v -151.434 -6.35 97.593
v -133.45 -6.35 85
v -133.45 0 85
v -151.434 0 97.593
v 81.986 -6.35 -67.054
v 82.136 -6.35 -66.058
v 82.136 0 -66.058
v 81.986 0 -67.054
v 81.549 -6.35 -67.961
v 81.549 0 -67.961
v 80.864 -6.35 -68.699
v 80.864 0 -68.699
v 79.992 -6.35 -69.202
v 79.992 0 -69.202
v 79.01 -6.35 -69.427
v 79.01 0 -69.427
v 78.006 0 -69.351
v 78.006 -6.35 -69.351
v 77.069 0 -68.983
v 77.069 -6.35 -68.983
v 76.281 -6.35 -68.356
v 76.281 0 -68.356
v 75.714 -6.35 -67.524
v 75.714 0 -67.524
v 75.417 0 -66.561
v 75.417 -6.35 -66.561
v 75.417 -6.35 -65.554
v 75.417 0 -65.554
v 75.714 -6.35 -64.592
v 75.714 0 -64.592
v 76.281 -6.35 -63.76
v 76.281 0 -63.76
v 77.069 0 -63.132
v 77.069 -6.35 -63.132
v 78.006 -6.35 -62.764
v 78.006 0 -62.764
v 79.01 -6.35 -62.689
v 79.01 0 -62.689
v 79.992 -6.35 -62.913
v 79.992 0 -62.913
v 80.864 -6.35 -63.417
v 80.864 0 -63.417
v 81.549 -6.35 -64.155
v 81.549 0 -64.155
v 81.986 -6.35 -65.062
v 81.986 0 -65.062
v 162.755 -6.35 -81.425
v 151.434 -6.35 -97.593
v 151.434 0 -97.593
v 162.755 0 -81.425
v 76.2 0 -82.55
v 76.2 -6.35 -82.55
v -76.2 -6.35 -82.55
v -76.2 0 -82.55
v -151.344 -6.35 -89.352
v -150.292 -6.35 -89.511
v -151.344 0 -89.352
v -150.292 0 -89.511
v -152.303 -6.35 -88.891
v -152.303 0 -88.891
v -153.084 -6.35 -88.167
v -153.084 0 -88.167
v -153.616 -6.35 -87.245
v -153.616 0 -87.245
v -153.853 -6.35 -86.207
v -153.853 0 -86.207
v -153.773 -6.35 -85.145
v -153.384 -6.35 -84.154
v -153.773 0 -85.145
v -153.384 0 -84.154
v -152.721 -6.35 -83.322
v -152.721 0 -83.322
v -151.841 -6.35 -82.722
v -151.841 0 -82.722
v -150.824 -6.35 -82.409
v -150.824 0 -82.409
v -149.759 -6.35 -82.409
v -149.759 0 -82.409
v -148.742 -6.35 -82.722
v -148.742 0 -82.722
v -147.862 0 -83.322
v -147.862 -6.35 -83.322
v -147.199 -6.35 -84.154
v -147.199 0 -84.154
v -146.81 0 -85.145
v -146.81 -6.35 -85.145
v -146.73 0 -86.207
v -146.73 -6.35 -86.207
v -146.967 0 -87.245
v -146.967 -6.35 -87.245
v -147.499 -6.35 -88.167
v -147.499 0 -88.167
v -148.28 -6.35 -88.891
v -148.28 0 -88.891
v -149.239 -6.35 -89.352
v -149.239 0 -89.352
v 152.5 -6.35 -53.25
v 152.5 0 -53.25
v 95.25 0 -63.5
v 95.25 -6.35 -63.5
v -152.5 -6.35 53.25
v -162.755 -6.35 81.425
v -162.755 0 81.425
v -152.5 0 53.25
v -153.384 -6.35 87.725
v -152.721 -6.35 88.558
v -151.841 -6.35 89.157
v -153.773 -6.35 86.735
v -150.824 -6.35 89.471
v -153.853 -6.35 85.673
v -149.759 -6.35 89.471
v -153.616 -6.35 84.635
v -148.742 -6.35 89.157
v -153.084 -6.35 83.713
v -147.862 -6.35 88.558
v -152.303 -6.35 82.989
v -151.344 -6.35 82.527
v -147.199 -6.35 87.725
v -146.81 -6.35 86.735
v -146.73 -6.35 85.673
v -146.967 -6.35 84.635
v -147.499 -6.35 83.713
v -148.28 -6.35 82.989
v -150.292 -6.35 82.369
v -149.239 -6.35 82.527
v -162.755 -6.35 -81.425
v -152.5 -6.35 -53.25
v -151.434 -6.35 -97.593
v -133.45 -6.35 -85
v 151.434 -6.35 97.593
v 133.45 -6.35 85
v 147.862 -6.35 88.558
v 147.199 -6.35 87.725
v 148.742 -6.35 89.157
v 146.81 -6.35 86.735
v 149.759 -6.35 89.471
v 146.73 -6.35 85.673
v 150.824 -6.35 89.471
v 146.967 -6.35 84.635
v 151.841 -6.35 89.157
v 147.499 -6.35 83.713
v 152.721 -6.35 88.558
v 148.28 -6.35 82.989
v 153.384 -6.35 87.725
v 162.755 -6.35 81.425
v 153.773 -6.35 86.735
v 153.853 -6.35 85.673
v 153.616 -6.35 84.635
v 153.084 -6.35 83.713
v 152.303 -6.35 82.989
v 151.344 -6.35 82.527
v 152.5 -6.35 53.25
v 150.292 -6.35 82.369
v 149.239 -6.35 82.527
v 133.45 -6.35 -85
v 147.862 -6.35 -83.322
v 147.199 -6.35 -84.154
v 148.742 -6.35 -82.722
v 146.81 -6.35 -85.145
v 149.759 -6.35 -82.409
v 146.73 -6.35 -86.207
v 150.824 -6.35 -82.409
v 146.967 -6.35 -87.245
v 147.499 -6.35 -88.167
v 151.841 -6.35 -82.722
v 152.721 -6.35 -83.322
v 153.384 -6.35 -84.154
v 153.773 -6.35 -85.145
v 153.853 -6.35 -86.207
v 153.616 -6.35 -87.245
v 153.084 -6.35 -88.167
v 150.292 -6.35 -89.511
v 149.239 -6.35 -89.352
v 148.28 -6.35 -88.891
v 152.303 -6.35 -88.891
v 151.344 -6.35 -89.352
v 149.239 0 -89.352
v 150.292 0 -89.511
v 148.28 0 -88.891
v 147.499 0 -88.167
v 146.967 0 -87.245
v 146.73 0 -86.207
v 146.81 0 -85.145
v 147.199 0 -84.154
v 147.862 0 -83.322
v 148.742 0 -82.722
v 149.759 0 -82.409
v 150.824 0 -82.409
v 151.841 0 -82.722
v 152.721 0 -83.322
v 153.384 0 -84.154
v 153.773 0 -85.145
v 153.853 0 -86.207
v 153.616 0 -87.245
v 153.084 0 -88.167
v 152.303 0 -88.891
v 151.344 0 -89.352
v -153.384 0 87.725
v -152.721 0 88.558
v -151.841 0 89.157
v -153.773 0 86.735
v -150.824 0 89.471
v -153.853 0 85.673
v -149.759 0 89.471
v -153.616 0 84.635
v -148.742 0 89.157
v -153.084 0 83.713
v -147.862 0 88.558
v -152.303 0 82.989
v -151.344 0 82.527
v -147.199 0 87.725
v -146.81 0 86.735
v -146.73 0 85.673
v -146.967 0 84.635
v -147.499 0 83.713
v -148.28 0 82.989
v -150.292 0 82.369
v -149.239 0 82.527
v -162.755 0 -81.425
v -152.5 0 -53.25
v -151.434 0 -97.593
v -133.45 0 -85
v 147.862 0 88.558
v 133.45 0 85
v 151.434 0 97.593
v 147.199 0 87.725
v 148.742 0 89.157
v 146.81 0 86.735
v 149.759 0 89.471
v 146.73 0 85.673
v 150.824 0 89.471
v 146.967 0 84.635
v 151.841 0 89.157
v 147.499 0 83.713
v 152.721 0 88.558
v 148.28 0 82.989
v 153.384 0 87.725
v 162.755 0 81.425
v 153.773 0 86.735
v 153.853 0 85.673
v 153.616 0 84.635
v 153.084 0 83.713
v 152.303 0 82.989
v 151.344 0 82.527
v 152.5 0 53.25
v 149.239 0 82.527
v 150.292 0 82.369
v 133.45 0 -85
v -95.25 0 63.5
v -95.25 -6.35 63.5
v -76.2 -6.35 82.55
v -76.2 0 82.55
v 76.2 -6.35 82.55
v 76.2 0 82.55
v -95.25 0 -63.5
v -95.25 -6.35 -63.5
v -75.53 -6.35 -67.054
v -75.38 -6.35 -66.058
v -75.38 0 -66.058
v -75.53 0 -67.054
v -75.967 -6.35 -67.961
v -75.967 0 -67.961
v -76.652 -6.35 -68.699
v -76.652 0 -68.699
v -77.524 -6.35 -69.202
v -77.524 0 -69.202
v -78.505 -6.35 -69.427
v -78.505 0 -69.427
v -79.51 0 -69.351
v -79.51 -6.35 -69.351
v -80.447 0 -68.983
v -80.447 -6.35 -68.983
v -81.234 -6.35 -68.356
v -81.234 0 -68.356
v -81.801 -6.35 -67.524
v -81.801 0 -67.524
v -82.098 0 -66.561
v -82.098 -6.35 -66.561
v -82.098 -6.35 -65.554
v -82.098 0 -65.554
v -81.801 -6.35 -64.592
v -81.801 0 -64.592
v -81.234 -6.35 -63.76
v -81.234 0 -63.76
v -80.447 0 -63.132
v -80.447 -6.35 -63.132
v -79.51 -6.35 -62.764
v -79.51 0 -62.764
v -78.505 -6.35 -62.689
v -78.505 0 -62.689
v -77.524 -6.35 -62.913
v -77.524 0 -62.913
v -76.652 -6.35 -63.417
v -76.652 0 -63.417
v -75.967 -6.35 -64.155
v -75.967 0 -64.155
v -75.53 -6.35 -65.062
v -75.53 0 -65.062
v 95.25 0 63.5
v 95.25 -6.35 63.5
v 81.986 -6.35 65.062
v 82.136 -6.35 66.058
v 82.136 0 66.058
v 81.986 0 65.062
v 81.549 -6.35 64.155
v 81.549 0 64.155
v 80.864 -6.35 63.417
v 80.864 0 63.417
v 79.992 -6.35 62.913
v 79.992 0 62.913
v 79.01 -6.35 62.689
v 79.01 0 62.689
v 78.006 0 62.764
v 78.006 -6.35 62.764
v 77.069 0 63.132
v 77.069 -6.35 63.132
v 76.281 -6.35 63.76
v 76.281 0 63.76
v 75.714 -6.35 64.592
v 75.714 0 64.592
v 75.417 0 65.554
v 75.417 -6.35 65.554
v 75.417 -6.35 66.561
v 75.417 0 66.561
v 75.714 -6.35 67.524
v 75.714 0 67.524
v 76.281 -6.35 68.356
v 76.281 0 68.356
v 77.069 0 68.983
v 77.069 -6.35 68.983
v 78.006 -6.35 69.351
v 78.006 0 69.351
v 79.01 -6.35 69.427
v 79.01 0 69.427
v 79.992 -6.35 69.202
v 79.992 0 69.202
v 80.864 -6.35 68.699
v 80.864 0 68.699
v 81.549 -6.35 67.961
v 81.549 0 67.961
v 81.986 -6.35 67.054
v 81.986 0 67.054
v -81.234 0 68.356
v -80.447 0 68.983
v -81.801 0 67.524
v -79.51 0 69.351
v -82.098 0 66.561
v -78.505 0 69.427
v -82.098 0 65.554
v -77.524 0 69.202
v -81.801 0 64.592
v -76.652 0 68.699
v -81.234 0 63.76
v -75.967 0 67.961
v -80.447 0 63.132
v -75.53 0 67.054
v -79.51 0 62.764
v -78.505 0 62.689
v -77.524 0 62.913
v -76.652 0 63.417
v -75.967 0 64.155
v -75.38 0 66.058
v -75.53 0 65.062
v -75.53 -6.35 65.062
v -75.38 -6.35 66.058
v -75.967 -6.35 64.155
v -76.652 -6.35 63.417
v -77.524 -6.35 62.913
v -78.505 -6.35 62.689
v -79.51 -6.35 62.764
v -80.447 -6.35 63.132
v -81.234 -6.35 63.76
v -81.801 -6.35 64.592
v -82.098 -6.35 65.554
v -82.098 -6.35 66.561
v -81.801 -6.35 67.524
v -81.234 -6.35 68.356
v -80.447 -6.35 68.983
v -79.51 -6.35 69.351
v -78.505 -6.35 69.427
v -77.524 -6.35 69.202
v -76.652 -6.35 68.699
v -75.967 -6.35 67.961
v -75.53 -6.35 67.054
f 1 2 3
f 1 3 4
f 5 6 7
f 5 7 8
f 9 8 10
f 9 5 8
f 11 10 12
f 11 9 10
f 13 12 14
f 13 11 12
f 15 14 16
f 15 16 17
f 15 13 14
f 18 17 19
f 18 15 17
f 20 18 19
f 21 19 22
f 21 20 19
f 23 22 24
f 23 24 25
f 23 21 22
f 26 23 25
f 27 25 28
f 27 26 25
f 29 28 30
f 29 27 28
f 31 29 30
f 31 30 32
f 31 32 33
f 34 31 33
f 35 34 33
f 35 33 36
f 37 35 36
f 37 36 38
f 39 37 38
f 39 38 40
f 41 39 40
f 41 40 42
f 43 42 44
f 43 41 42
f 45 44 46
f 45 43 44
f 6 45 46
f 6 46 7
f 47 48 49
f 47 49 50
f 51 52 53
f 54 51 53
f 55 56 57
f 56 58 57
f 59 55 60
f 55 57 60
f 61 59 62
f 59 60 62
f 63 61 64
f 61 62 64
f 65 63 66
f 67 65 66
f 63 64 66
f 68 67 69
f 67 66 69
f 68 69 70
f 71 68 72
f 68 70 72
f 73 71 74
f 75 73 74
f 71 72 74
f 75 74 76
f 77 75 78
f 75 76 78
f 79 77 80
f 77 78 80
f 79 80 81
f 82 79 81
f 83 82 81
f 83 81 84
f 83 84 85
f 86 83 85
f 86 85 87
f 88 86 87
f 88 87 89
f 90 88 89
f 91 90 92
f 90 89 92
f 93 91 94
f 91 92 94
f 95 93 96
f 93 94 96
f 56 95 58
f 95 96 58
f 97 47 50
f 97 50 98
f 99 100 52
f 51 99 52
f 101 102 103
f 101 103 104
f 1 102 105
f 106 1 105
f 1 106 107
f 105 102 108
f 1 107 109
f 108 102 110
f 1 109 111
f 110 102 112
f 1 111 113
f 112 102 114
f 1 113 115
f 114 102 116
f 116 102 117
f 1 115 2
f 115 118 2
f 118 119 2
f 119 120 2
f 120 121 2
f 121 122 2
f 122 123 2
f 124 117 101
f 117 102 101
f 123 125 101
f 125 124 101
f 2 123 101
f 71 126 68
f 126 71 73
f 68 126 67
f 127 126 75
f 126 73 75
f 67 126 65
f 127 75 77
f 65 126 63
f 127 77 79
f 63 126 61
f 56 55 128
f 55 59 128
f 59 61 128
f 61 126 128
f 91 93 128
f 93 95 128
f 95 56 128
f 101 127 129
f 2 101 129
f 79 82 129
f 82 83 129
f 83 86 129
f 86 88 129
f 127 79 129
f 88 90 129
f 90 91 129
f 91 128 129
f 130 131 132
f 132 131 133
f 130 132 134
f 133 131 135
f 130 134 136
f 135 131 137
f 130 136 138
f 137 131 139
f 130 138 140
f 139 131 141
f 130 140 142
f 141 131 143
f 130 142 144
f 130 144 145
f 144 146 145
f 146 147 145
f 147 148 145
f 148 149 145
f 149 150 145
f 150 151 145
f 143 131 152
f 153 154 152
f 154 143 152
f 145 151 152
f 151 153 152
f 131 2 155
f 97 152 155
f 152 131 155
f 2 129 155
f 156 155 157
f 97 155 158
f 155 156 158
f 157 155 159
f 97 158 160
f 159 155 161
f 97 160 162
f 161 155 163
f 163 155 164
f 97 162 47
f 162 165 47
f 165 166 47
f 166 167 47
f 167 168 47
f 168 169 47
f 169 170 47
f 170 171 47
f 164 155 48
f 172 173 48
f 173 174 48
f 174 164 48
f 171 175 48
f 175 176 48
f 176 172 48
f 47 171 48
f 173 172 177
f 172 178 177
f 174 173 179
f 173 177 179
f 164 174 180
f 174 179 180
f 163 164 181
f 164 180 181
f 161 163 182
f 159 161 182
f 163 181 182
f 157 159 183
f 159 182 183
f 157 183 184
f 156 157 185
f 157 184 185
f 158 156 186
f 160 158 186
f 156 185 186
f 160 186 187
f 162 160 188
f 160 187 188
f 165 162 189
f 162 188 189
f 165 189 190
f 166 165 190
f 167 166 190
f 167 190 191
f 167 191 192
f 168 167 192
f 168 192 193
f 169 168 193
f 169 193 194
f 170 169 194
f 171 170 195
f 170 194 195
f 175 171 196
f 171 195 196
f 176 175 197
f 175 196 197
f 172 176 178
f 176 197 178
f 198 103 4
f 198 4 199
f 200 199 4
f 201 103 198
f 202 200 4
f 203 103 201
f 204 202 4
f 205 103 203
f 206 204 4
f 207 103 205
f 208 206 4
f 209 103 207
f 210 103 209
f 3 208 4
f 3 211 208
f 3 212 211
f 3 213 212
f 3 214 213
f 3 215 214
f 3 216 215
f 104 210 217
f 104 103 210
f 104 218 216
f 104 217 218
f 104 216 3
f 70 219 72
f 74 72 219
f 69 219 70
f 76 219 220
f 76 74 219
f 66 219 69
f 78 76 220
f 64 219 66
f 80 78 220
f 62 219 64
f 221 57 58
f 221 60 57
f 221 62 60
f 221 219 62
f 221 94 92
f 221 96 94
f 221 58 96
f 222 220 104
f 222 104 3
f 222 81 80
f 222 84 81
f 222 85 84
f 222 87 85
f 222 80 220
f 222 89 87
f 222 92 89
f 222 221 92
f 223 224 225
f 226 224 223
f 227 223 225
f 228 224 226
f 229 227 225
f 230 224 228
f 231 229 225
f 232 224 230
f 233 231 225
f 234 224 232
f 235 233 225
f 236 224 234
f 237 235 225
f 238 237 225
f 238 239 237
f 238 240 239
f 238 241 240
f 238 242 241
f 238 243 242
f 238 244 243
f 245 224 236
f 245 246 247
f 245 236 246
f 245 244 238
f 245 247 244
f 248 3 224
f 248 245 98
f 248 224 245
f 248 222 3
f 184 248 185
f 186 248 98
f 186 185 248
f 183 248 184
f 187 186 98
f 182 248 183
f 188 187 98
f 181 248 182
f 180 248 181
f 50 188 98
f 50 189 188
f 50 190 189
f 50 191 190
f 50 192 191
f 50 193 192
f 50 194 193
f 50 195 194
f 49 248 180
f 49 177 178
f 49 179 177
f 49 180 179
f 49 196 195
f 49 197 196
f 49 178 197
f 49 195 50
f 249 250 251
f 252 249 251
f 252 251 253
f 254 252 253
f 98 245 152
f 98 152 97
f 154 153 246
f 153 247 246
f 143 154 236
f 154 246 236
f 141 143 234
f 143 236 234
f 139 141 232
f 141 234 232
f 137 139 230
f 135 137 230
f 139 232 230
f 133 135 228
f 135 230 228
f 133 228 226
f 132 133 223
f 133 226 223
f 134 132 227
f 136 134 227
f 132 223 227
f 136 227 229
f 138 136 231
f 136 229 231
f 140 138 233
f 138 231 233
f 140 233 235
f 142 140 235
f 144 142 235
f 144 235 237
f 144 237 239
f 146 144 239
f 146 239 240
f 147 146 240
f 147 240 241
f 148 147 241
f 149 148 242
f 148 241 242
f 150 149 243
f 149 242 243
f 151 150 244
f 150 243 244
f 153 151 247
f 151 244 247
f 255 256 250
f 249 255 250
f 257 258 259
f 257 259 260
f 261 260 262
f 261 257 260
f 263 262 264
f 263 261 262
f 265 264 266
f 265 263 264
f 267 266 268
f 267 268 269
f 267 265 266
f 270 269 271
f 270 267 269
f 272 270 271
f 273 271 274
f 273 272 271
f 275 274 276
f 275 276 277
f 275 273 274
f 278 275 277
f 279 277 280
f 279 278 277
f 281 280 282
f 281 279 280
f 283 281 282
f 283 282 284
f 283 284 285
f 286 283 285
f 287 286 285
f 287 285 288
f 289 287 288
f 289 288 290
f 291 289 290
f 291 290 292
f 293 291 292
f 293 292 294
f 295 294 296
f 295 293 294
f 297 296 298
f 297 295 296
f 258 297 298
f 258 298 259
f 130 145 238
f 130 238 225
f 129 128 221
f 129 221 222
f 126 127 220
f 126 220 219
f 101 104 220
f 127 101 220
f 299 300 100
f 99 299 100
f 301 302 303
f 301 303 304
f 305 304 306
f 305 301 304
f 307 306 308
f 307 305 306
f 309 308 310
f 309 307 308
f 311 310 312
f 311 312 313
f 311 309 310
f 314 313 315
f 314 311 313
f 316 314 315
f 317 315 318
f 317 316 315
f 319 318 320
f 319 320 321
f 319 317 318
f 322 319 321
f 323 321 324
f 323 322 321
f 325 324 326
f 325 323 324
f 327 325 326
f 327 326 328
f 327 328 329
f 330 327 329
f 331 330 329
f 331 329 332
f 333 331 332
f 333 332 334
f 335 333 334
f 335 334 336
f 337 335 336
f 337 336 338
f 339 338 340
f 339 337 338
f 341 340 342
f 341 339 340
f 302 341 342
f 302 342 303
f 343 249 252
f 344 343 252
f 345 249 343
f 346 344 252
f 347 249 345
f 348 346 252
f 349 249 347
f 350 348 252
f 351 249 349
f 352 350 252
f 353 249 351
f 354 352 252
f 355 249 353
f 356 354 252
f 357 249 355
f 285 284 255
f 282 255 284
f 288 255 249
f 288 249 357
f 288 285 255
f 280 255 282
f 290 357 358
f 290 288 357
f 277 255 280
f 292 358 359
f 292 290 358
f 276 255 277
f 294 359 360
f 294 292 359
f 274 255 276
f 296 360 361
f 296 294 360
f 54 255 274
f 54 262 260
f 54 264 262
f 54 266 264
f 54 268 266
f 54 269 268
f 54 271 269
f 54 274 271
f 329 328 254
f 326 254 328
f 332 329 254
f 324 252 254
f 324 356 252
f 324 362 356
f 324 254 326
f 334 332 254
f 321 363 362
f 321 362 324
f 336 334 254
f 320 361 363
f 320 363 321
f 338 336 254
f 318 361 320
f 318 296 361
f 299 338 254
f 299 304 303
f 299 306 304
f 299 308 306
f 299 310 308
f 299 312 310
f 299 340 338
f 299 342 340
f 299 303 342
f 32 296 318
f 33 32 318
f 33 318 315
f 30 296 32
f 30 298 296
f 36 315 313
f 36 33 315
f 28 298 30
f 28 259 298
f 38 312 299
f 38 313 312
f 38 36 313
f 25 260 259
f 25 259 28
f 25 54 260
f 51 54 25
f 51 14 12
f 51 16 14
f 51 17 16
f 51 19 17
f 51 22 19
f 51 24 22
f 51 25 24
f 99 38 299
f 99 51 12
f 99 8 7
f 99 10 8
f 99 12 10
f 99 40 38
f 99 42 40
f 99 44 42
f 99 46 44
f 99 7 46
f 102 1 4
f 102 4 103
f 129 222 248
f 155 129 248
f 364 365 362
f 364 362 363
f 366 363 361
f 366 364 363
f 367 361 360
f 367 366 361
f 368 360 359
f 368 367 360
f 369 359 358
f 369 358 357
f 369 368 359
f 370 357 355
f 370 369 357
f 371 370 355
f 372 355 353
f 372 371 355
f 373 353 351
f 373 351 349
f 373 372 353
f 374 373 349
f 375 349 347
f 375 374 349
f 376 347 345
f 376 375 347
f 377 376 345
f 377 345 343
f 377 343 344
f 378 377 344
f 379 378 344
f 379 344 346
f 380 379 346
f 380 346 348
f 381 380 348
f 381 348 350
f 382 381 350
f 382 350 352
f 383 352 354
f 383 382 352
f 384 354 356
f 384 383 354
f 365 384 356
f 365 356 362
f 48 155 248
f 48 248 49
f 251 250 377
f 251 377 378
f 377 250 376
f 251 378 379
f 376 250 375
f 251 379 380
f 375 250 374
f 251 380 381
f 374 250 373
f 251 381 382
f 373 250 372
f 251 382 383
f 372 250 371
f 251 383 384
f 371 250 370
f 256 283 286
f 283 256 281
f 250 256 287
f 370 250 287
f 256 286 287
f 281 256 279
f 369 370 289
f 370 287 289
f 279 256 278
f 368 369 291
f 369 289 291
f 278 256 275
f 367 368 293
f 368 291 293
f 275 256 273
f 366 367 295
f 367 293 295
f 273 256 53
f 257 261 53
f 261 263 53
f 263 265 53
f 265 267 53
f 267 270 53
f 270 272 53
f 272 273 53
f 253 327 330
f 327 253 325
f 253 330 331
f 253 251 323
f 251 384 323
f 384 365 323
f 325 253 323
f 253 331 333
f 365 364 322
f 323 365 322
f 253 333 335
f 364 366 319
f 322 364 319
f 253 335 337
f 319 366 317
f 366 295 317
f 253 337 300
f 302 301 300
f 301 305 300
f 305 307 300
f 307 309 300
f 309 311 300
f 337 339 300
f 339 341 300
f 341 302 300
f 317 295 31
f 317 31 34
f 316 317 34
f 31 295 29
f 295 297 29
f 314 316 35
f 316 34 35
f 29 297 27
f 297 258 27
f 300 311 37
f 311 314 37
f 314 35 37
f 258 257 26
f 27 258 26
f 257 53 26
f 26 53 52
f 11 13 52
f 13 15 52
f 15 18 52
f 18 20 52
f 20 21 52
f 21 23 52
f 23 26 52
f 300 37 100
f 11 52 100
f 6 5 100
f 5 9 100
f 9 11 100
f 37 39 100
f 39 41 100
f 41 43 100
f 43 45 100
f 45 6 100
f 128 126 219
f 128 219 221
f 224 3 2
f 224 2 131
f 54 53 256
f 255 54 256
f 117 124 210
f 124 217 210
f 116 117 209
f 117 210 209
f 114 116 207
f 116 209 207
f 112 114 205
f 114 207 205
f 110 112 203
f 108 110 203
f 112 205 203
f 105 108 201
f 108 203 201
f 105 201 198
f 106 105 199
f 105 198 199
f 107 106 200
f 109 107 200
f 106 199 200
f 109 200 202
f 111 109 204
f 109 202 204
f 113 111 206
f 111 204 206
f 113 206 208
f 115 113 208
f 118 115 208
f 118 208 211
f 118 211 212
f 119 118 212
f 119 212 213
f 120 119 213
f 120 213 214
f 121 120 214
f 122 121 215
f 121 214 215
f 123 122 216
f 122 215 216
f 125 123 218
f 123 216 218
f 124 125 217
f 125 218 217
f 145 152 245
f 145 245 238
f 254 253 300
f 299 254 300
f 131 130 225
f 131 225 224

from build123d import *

# Parameters (mm, degrees)
MARKUP1_START                    = -6.35
MARKUP1_OUTLINE_R                = 3.3782
MARKUP1_DEPTH                    = 6.35
SKETCH2_W                        = 305.000000108
SKETCH2_H                        = 170.000000106
BOSS_EXTRUDE1_DEPTH              = 6.35
BOSS_EXTRUDE2_DEPTH              = 6.35
SKETCH5_W                        = 3.57124
SKETCH5_H                        = 6.35
F_1_4_CLEARANCE_HOLE1_AT_2_COUNT = 2
F_1_4_CLEARANCE_HOLE1_AT_2_PITCH = 300.583026684
F_1_4_CLEARANCE_HOLE1_AT_3_COUNT = 2
F_1_4_CLEARANCE_HOLE1_AT_3_PITCH = 346.255396975
F_1_4_CLEARANCE_HOLE1_AT_4_COUNT = 2
F_1_4_CLEARANCE_HOLE1_AT_4_PITCH = 171.879737036


# Read off the part's stored shape, not the designer's step: Markup1
with BuildPart() as part:
    # Markup1 outline → Markup1 (new body)
    with BuildSketch(Plane(origin=(0, 0, 0), x_dir=(1, 0, 0), z_dir=(0, 1, 0)).offset(MARKUP1_START)):
        Polygon((76.2, -82.55), (95.25, -63.5), (95.25, 63.5), (76.2, 82.55), (-76.2, 82.55), (-95.25, 63.5), (-95.25, -63.5), (-76.2, -82.55), align=None)
        with Locations((-78.75778, -66.05778)):
            Circle(MARKUP1_OUTLINE_R, mode=Mode.SUBTRACT)
        with Locations((78.75778, -66.05778)):
            Circle(MARKUP1_OUTLINE_R, mode=Mode.SUBTRACT)
        with Locations((-78.75778, 66.05778)):
            Circle(MARKUP1_OUTLINE_R, mode=Mode.SUBTRACT)
        with Locations((78.75778, 66.05778)):
            Circle(MARKUP1_OUTLINE_R, mode=Mode.SUBTRACT)
    extrude(amount=MARKUP1_DEPTH)


with BuildPart() as body_2:
    # Sketch2 → Boss-Extrude1 (new body)
    with BuildSketch(Plane(origin=(0, 0, 0), x_dir=(1, 0, 0), z_dir=(0, 1, 0))):
        Rectangle(SKETCH2_W, SKETCH2_H)
    extrude(amount=-BOSS_EXTRUDE1_DEPTH)

    # Sketch3 → Boss-Extrude2 (add)
    with BuildSketch(Plane.XZ.offset(6.35)):
        Polygon((133.450000054, 85.000000053), (133.450000054, 53.250000053), (152.500000054, 53.250000053), (162.75496375, 81.425281244), (151.4343574, 97.592782637), align=None)
        Polygon((152.500000054, -53.250000053), (133.450000054, -53.250000053), (133.450000054, -85.000000053), (151.4343574, -97.592782637), (162.75496375, -81.425281244), align=None)
        Polygon((-133.450000054, -85.000000053), (-133.450000054, -53.250000053), (-152.500000054, -53.250000053), (-162.75496375, -81.425281244), (-151.4343574, -97.592782637), align=None)
        Polygon((-152.500000054, 53.250000053), (-133.450000054, 53.250000053), (-133.450000054, 85.000000053), (-151.4343574, 97.592782637), (-162.75496375, 81.425281244), align=None)
    extrude(amount=-BOSS_EXTRUDE2_DEPTH)

    # Sketch5 → 1/4 Clearance Hole1 (revolve, cut)
    with BuildSketch(Plane(origin=(150.291513342, -6.35, -85.939868518), x_dir=(0, 0, -1), z_dir=(1, 0, 0))):
        with Locations((1.78562, 3.175)):
            Rectangle(SKETCH5_W, SKETCH5_H)
    f_1_4_clearance_hole1 = revolve(axis=Axis((150.291513342, -12.7, -85.939868518), (0, 1, 0)), mode=Mode.SUBTRACT)

    # 1/4 Clearance Hole1 at 2: 1/4 Clearance Hole1 ×2
    with Locations(*[(-i * F_1_4_CLEARANCE_HOLE1_AT_2_PITCH, 0, 0) for i in range(1, F_1_4_CLEARANCE_HOLE1_AT_2_COUNT)]):
        add(f_1_4_clearance_hole1, mode=Mode.SUBTRACT)

    # 1/4 Clearance Hole1 at 3: 1/4 Clearance Hole1 ×2
    with Locations(*[Vector(-0.8680962934015001, 0, 0.49639583537996856) * (i * F_1_4_CLEARANCE_HOLE1_AT_3_PITCH) for i in range(1, F_1_4_CLEARANCE_HOLE1_AT_3_COUNT)]):
        add(f_1_4_clearance_hole1, mode=Mode.SUBTRACT)

    # 1/4 Clearance Hole1 at 4: 1/4 Clearance Hole1 ×2
    with Locations(*[(0, 0, i * F_1_4_CLEARANCE_HOLE1_AT_4_PITCH) for i in range(1, F_1_4_CLEARANCE_HOLE1_AT_4_COUNT)]):
        add(f_1_4_clearance_hole1, mode=Mode.SUBTRACT)


solid = Compound([part.part, body_2.part])
